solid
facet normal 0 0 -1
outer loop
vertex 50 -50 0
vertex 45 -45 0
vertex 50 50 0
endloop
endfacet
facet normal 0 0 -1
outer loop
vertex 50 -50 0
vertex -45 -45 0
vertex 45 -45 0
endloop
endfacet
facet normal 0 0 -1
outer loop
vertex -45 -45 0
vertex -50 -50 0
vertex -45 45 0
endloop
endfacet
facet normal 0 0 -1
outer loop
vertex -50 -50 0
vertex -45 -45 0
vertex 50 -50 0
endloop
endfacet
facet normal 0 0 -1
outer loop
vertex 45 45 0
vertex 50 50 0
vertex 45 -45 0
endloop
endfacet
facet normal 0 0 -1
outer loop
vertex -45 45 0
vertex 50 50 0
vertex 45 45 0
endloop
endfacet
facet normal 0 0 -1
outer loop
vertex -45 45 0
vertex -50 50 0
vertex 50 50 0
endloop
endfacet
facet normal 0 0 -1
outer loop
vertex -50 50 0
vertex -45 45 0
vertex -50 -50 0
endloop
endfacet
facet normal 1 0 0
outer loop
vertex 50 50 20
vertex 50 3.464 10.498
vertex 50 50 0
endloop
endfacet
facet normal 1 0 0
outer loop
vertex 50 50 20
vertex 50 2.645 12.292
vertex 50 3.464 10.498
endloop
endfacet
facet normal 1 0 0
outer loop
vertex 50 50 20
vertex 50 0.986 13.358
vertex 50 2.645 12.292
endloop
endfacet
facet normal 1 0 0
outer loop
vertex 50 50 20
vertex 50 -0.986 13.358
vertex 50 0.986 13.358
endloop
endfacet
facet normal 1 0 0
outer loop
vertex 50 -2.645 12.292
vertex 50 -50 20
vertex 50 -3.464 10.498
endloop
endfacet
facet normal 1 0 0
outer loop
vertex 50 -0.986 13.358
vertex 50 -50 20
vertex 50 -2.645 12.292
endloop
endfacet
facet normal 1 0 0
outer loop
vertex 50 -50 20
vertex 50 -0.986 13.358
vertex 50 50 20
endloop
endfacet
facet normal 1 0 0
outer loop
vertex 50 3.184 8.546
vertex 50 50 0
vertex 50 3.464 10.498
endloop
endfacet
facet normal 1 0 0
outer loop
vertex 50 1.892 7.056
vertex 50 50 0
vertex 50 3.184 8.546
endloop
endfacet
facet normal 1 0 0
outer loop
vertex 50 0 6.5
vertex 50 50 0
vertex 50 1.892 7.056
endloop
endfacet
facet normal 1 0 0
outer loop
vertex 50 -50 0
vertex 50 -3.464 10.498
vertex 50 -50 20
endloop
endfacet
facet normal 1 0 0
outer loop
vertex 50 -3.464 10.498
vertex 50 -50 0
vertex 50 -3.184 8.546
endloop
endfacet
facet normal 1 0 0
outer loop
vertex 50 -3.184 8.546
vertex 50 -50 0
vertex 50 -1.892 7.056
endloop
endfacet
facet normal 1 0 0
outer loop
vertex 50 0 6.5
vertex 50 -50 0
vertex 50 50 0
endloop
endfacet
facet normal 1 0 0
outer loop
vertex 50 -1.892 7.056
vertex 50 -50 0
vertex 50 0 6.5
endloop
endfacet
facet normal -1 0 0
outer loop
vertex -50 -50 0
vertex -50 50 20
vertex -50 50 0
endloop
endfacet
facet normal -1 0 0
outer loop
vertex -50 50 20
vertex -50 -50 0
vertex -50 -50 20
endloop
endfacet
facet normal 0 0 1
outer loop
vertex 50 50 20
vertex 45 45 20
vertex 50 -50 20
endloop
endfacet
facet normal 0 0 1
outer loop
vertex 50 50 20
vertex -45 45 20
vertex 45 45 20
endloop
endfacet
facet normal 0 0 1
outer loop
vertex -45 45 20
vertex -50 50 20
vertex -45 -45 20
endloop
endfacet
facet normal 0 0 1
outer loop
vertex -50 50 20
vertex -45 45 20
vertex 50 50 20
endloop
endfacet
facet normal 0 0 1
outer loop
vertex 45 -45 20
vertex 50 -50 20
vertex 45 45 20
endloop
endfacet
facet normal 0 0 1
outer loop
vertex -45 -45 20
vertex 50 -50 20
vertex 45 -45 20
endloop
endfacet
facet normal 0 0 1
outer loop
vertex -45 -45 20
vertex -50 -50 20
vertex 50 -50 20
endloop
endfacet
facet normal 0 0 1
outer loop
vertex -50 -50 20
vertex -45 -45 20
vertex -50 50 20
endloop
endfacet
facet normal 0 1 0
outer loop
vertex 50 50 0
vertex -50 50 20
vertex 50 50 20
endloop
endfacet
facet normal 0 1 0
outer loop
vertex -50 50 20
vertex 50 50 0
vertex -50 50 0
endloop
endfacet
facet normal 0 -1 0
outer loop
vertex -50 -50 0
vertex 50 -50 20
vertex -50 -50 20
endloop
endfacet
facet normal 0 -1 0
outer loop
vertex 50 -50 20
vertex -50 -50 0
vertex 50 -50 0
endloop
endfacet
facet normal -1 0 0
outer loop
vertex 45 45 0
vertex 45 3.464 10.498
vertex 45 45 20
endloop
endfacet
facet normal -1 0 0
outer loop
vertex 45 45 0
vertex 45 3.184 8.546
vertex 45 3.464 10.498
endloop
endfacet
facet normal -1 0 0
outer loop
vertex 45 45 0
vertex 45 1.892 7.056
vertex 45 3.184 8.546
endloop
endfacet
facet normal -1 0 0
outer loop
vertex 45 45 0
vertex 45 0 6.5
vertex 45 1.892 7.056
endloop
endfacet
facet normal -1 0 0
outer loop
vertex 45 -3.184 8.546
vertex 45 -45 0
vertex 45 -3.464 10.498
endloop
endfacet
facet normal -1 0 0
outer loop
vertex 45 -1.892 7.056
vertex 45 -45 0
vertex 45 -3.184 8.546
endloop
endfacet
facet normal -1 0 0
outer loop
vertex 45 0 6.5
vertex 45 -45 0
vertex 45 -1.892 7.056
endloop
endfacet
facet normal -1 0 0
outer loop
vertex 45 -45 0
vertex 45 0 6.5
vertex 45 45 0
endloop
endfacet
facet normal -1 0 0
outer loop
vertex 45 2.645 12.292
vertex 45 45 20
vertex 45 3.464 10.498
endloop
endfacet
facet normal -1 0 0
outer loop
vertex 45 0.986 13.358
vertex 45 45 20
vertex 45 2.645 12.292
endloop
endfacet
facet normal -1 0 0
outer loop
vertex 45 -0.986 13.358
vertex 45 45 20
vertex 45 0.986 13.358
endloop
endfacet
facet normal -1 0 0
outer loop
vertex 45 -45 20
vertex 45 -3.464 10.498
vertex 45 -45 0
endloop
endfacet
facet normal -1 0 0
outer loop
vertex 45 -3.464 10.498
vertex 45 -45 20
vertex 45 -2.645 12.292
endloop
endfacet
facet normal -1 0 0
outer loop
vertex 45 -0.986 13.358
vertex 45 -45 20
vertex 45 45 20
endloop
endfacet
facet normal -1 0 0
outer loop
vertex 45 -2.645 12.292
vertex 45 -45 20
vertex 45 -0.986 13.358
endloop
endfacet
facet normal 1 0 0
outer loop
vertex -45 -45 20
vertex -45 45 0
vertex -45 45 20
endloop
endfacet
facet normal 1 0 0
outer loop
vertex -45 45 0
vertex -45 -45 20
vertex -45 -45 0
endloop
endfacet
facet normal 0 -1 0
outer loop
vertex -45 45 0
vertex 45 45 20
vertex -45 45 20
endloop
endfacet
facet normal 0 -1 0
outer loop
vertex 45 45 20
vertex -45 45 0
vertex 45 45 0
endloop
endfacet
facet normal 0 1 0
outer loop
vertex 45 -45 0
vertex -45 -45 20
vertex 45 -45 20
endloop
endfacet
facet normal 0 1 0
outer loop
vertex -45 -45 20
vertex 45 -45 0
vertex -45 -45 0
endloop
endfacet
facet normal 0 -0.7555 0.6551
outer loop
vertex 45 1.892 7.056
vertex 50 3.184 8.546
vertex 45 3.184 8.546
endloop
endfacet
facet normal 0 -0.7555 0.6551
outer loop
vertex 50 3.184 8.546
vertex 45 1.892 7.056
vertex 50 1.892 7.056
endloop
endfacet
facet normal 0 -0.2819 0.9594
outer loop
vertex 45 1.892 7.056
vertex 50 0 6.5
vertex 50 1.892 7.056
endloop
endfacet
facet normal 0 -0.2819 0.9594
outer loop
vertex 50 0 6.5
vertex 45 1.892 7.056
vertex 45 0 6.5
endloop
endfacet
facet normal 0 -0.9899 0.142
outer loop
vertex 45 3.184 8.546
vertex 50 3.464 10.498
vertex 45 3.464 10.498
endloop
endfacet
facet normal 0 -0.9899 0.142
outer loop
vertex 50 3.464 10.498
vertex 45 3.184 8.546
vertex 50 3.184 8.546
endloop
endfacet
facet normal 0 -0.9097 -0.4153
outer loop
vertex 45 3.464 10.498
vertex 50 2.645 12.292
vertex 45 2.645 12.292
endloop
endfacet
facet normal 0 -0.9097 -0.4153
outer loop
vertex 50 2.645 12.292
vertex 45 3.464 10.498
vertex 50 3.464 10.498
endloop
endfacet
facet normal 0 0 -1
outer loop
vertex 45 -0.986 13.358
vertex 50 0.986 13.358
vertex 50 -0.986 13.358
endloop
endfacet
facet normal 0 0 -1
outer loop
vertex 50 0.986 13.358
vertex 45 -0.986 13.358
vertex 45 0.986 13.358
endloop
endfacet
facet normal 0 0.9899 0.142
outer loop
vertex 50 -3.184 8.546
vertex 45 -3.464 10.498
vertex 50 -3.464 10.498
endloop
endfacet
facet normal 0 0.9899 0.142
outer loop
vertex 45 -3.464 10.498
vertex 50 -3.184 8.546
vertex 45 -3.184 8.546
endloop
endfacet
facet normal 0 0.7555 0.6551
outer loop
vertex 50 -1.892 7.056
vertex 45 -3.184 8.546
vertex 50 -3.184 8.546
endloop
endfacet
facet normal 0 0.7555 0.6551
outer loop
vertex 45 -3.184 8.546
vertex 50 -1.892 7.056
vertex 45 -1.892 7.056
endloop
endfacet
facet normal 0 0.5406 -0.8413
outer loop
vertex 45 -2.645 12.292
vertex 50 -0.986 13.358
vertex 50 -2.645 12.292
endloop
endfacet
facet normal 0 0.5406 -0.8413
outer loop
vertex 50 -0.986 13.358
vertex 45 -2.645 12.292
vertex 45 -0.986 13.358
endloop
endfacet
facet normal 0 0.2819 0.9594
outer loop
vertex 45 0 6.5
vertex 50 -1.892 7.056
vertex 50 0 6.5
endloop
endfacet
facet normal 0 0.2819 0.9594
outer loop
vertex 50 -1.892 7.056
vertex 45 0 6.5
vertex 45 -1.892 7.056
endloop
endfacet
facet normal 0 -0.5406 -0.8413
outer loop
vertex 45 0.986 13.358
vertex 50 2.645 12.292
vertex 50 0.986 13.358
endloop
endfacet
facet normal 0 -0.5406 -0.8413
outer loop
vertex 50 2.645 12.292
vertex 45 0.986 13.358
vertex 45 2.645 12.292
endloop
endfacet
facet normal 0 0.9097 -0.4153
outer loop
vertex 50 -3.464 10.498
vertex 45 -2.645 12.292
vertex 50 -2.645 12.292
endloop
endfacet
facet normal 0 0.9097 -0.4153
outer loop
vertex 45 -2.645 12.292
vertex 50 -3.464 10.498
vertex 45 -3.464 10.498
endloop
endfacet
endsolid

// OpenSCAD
translate([0,0,10]) rotate([0,90,0]) difference() {
difference() {
cube([20,100,100],center=true); 
cube([20,90,90],center=true); 
}
cylinder(100,3.5,3.5); 
}
